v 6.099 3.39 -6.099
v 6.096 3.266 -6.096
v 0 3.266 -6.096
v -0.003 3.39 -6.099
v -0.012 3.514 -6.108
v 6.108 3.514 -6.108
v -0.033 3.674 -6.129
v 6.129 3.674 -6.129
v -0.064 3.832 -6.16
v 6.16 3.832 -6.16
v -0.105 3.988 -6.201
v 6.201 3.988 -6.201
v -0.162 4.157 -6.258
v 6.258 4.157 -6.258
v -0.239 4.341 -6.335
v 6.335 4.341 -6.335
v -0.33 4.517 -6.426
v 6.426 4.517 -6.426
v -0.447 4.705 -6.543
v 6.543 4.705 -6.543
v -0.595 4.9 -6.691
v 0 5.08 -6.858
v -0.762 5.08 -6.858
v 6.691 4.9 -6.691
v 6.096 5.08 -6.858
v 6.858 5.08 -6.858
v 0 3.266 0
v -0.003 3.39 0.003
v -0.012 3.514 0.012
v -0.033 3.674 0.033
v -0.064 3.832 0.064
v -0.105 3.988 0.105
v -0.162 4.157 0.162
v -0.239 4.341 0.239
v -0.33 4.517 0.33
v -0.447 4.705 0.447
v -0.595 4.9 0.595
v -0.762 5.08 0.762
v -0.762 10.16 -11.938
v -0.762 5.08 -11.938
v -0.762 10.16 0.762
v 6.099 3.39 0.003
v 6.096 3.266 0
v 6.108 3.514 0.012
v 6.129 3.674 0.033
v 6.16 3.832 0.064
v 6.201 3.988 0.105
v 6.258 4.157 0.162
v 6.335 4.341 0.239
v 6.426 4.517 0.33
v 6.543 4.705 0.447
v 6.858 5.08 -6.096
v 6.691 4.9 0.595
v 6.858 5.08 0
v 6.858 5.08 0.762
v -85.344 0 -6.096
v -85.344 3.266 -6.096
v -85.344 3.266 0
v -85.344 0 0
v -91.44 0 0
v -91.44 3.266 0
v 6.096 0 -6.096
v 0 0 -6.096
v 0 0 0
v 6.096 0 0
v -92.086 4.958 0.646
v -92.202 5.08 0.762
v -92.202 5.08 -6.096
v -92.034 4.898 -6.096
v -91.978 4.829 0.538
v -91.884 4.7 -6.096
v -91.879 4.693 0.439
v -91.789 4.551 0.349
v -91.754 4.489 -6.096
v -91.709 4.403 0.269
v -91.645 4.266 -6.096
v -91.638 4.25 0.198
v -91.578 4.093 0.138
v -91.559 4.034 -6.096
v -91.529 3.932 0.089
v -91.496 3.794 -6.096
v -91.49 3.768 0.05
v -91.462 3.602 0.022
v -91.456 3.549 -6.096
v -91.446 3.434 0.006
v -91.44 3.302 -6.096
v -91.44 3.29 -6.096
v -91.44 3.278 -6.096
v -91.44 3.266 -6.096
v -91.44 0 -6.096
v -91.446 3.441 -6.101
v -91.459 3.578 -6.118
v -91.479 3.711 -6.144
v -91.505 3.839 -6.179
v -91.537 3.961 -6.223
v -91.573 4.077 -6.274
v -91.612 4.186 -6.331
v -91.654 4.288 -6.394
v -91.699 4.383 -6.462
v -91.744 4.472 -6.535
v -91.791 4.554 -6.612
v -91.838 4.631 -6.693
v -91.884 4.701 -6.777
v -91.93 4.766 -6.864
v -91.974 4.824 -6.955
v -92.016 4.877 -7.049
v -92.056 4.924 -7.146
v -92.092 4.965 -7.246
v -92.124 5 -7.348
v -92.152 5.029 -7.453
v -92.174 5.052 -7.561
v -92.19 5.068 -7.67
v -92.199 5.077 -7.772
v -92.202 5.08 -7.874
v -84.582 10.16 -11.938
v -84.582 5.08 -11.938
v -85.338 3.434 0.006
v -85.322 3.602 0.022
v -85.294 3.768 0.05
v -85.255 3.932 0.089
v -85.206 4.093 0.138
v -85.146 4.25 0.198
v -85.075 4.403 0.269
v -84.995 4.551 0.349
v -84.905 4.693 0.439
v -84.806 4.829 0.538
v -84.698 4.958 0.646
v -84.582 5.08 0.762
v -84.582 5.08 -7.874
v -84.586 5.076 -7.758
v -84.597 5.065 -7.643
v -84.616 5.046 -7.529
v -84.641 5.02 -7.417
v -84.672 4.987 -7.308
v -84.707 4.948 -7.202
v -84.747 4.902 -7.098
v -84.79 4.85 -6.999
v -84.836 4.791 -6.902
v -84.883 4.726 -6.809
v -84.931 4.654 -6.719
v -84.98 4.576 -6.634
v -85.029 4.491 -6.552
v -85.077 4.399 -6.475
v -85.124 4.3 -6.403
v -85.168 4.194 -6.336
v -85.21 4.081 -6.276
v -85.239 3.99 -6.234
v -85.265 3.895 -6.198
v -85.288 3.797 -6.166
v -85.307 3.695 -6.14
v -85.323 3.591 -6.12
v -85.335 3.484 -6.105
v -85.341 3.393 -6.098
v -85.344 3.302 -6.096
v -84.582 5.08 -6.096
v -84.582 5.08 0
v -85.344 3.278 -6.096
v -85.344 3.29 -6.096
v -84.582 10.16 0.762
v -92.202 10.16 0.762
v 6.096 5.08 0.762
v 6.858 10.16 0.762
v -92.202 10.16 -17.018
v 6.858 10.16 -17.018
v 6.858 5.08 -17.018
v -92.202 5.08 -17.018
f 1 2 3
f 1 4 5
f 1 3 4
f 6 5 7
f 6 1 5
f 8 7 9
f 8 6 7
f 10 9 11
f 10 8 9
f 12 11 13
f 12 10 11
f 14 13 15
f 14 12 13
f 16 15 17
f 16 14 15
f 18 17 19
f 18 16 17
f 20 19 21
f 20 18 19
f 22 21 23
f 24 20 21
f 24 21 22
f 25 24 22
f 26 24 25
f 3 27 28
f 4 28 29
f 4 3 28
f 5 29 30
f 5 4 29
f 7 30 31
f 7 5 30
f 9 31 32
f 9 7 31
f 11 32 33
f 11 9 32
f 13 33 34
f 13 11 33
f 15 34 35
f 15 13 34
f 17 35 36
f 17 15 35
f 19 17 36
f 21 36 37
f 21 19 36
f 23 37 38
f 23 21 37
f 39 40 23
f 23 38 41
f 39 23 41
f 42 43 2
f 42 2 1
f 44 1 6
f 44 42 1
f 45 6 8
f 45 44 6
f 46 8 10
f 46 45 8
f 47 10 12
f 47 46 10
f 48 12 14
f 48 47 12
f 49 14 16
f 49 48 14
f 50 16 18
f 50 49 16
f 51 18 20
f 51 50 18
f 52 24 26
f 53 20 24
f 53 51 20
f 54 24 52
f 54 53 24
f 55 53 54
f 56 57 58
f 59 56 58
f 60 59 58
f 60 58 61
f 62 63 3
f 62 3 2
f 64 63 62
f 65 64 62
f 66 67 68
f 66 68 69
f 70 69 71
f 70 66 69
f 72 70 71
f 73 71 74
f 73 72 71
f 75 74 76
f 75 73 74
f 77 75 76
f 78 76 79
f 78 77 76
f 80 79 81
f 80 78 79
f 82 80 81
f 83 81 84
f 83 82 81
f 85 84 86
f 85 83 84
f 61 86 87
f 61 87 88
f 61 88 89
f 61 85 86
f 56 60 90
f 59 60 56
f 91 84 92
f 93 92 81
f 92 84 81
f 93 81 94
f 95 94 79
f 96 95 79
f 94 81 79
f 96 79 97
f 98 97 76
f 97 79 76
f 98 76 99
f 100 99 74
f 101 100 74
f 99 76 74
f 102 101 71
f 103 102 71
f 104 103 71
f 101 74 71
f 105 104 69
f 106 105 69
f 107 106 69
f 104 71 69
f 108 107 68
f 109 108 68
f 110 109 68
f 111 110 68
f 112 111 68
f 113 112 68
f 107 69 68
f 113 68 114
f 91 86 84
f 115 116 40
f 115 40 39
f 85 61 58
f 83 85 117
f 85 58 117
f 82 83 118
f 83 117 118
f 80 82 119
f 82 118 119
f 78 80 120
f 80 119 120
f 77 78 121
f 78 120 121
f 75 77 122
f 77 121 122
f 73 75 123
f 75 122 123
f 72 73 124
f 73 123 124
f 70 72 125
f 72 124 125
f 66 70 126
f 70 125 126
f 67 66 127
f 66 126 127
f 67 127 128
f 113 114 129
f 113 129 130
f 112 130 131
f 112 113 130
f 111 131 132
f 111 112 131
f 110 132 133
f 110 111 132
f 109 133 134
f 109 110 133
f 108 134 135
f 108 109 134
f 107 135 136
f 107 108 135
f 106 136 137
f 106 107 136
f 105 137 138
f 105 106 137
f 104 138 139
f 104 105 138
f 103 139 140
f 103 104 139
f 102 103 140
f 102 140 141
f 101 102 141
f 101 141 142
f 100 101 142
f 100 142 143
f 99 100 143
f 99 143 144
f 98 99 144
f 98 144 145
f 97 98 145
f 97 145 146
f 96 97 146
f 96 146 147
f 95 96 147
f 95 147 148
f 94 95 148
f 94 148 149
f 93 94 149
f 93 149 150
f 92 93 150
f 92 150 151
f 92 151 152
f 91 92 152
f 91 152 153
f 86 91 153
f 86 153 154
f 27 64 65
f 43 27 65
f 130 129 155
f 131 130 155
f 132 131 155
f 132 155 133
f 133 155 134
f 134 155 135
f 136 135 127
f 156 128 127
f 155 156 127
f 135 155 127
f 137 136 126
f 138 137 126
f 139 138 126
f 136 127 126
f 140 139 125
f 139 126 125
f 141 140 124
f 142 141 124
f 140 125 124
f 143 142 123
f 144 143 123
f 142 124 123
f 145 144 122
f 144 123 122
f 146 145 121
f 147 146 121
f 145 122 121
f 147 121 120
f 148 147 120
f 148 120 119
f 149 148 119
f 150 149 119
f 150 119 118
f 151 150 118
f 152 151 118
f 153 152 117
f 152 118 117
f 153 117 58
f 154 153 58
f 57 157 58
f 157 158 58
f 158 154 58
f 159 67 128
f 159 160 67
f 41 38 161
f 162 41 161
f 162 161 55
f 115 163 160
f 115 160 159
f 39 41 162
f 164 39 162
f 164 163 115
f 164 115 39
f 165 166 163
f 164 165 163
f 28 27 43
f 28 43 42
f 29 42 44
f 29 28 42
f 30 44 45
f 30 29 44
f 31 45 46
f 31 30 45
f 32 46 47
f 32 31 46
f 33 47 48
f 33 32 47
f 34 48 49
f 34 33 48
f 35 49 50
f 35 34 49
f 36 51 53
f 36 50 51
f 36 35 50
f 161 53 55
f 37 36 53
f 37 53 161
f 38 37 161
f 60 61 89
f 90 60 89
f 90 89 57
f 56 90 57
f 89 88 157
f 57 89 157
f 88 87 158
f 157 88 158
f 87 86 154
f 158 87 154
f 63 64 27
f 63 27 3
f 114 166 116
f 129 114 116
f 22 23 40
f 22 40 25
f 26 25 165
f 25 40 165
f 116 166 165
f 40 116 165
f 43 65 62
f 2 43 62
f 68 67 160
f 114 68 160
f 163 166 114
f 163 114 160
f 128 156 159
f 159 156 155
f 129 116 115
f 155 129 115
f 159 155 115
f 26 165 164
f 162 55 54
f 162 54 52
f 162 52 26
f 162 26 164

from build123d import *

# Parameters (mm, degrees)
SKETCH1_W           = 6.096
SKETCH1_H           = 6.096
BOSS_EXTRUDE1_DEPTH = 5.08
SKETCH2_W           = 7.62
SKETCH2_H           = 7.62
BOSS_EXTRUDE2_DEPTH = 5.08
FILLET1_R           = 2.54
SKETCH3_W           = 7.62
SKETCH3_H           = 5.08
BOSS_EXTRUDE3_DEPTH = 10.16
SKETCH4_W           = 5.08
SKETCH4_H           = 5.08
BOSS_EXTRUDE4_DEPTH = 83.82
SKETCH6_W           = 5.08
SKETCH6_H           = 5.08
BOSS_EXTRUDE5_DEPTH = 7.62
SKETCH8_W           = 7.62
SKETCH8_H           = 5.08
BOSS_EXTRUDE6_DEPTH = 12.7
SKETCH9_W           = 6.096
SKETCH9_H           = 6.096
BOSS_EXTRUDE7_DEPTH = 5.08
FILLET7_R           = 2.54
FILLET8_R           = 2.54
FILLET9_R           = 2.54
FILLET11_R          = 1.778


with BuildPart() as part:
    # Sketch1 → Boss-Extrude1 (new body)
    with BuildSketch(Plane(origin=(0, 0, 0), x_dir=(1, 0, 0), z_dir=(0, 1, 0))):
        with Locations((3.048, 3.048)):
            Rectangle(SKETCH1_W, SKETCH1_H)
    extrude(amount=BOSS_EXTRUDE1_DEPTH)

    # Sketch2 → Boss-Extrude2 (add)
    with BuildSketch(Plane(origin=(0, 5.08, 0), x_dir=(1, 0, 0), z_dir=(0, 1, 0))):
        with Locations((3.048, 3.048)):
            Rectangle(SKETCH2_W, SKETCH2_H)
    extrude(amount=BOSS_EXTRUDE2_DEPTH)

    # Fillet1
    # the kernel refuses this fillet: 2.54 mm, written as the material it adds along each edge
    with BuildSketch(Plane(origin=(6.096, 5.08, 0), x_dir=(1, 0, 0), z_dir=(0, 0, -1)), Plane(origin=(6.096, 5.08, -6.096), x_dir=(0, 0, -1), z_dir=(-1, 0, 0)), Plane(origin=(0, 5.08, -6.096), x_dir=(-1, 0, 0), z_dir=(0, 0, 1)), Plane(origin=(0, 5.08, 0), x_dir=(0, 0, 1), z_dir=(1, 0, 0))) as fillet1_piece_1:
        with BuildLine():
            CenterArc((2.54, 1.813922821), FILLET1_R, 180, 45.572995999)
            Line((0, 1.813922821), (-0.0508, 1.813922821))
            Line((-0.0508, 1.813922821), (-0.0508, 0))
            Line((-0.0508, 0), (0, -0.0508))
            ThreePointArc((0, -0.0508), (0.381, -0.0508), (0.72644, -0.036278456))
            Line((0.72644, -0.036278456), (0.762, 0))
        make_face()
    extrude(amount=6.096)
    with BuildSketch(Plane(origin=(6.096, 5.08, 4.534807052), x_dir=(1, 0, 0), z_dir=(0, 0, -1))) as fillet1_piece_2a_section:
        with BuildLine():
            CenterArc((2.54, 1.813922821), FILLET1_R, 180, 45.572995999)
            Line((0, 1.813922821), (-0.0508, 1.813922821))
            Line((-0.0508, 1.813922821), (-0.0508, 0))
            Line((-0.0508, 0), (0, -0.0508))
            ThreePointArc((0, -0.0508), (0.381, -0.0508), (0.72644, -0.036278456))
            Line((0.72644, -0.036278456), (0.762, 0))
        make_face()
    fillet1_piece_2a = extrude(amount=10.630807052, mode=Mode.PRIVATE)
    fillet1_piece_2a = split(fillet1_piece_2a, bisect_by=Plane(origin=(6.284412047, 4.594869389, 0.762), z_dir=(0, 0, -1)), keep=Keep.TOP, mode=Mode.PRIVATE)
    fillet1_piece_2a = split(fillet1_piece_2a, bisect_by=Plane(origin=(6.284412047, 4.594869389, 0), z_dir=(0, 0, 1)), keep=Keep.TOP, mode=Mode.PRIVATE)
    with BuildSketch(Plane(origin=(0, 5.08, 0), x_dir=(0, 0, 1), z_dir=(1, 0, 0))) as fillet1_piece_2b_section:
        with BuildLine():
            CenterArc((2.54, 1.813922821), FILLET1_R, 180, 45.572995999)
            Line((0, 1.813922821), (-0.0508, 1.813922821))
            Line((-0.0508, 1.813922821), (-0.0508, 0))
            Line((-0.0508, 0), (0, -0.0508))
            ThreePointArc((0, -0.0508), (0.381, -0.0508), (0.72644, -0.036278456))
            Line((0.72644, -0.036278456), (0.762, 0))
        make_face()
    fillet1_piece_2b = extrude(amount=10.630807052, mode=Mode.PRIVATE)
    fillet1_piece_2b = split(fillet1_piece_2b, bisect_by=Plane(origin=(6.858, 4.594869389, 0.188412047), z_dir=(-1, 0, 0)), keep=Keep.TOP, mode=Mode.PRIVATE)
    fillet1_piece_2b = split(fillet1_piece_2b, bisect_by=Plane(origin=(6.096, 4.594869389, 0.188412047), z_dir=(1, 0, 0)), keep=Keep.TOP, mode=Mode.PRIVATE)
    fillet1_piece_2 = fillet1_piece_2a & fillet1_piece_2b
    add(fillet1_piece_2)
    with BuildSketch(Plane(origin=(10.630807052, 5.08, -6.096), x_dir=(0, 0, -1), z_dir=(-1, 0, 0))) as fillet1_piece_3a_section:
        with BuildLine():
            CenterArc((2.54, 1.813922821), FILLET1_R, 180, 45.572995999)
            Line((0, 1.813922821), (-0.0508, 1.813922821))
            Line((-0.0508, 1.813922821), (-0.0508, 0))
            Line((-0.0508, 0), (0, -0.0508))
            ThreePointArc((0, -0.0508), (0.381, -0.0508), (0.72644, -0.036278456))
            Line((0.72644, -0.036278456), (0.762, 0))
        make_face()
    fillet1_piece_3a = extrude(amount=10.630807052, mode=Mode.PRIVATE)
    fillet1_piece_3a = split(fillet1_piece_3a, bisect_by=Plane(origin=(6.858, 4.594869389, -6.284412047), z_dir=(-1, 0, 0)), keep=Keep.TOP, mode=Mode.PRIVATE)
    fillet1_piece_3a = split(fillet1_piece_3a, bisect_by=Plane(origin=(6.096, 4.594869389, -6.284412047), z_dir=(1, 0, 0)), keep=Keep.TOP, mode=Mode.PRIVATE)
    with BuildSketch(Plane(origin=(6.096, 5.08, 0), x_dir=(1, 0, 0), z_dir=(0, 0, -1))) as fillet1_piece_3b_section:
        with BuildLine():
            CenterArc((2.54, 1.813922821), FILLET1_R, 180, 45.572995999)
            Line((0, 1.813922821), (-0.0508, 1.813922821))
            Line((-0.0508, 1.813922821), (-0.0508, 0))
            Line((-0.0508, 0), (0, -0.0508))
            ThreePointArc((0, -0.0508), (0.381, -0.0508), (0.72644, -0.036278456))
            Line((0.72644, -0.036278456), (0.762, 0))
        make_face()
    fillet1_piece_3b = extrude(amount=10.630807052, mode=Mode.PRIVATE)
    fillet1_piece_3b = split(fillet1_piece_3b, bisect_by=Plane(origin=(6.284412047, 4.594869389, -6.858), z_dir=(0, 0, 1)), keep=Keep.TOP, mode=Mode.PRIVATE)
    fillet1_piece_3b = split(fillet1_piece_3b, bisect_by=Plane(origin=(6.284412047, 4.594869389, -6.096), z_dir=(0, 0, -1)), keep=Keep.TOP, mode=Mode.PRIVATE)
    fillet1_piece_3 = fillet1_piece_3a & fillet1_piece_3b
    add(fillet1_piece_3)
    with BuildSketch(Plane(origin=(0, 5.08, -10.630807052), x_dir=(-1, 0, 0), z_dir=(0, 0, 1))) as fillet1_piece_4a_section:
        with BuildLine():
            CenterArc((2.54, 1.813922821), FILLET1_R, 180, 45.572995999)
            Line((0, 1.813922821), (-0.0508, 1.813922821))
            Line((-0.0508, 1.813922821), (-0.0508, 0))
            Line((-0.0508, 0), (0, -0.0508))
            ThreePointArc((0, -0.0508), (0.381, -0.0508), (0.72644, -0.036278456))
            Line((0.72644, -0.036278456), (0.762, 0))
        make_face()
    fillet1_piece_4a = extrude(amount=10.630807052, mode=Mode.PRIVATE)
    fillet1_piece_4a = split(fillet1_piece_4a, bisect_by=Plane(origin=(-0.188412047, 4.594869389, -6.858), z_dir=(0, 0, 1)), keep=Keep.TOP, mode=Mode.PRIVATE)
    fillet1_piece_4a = split(fillet1_piece_4a, bisect_by=Plane(origin=(-0.188412047, 4.594869389, -6.096), z_dir=(0, 0, -1)), keep=Keep.TOP, mode=Mode.PRIVATE)
    with BuildSketch(Plane(origin=(6.096, 5.08, -6.096), x_dir=(0, 0, -1), z_dir=(-1, 0, 0))) as fillet1_piece_4b_section:
        with BuildLine():
            CenterArc((2.54, 1.813922821), FILLET1_R, 180, 45.572995999)
            Line((0, 1.813922821), (-0.0508, 1.813922821))
            Line((-0.0508, 1.813922821), (-0.0508, 0))
            Line((-0.0508, 0), (0, -0.0508))
            ThreePointArc((0, -0.0508), (0.381, -0.0508), (0.72644, -0.036278456))
            Line((0.72644, -0.036278456), (0.762, 0))
        make_face()
    fillet1_piece_4b = extrude(amount=10.630807052, mode=Mode.PRIVATE)
    fillet1_piece_4b = split(fillet1_piece_4b, bisect_by=Plane(origin=(-0.762, 4.594869389, -6.284412047), z_dir=(1, 0, 0)), keep=Keep.TOP, mode=Mode.PRIVATE)
    fillet1_piece_4b = split(fillet1_piece_4b, bisect_by=Plane(origin=(0, 4.594869389, -6.284412047), z_dir=(-1, 0, 0)), keep=Keep.TOP, mode=Mode.PRIVATE)
    fillet1_piece_4 = fillet1_piece_4a & fillet1_piece_4b
    add(fillet1_piece_4)
    with BuildSketch(Plane(origin=(0, 5.08, -6.096), x_dir=(-1, 0, 0), z_dir=(0, 0, 1))) as fillet1_piece_5a_section:
        with BuildLine():
            CenterArc((2.54, 1.813922821), FILLET1_R, 180, 45.572995999)
            Line((0, 1.813922821), (-0.0508, 1.813922821))
            Line((-0.0508, 1.813922821), (-0.0508, 0))
            Line((-0.0508, 0), (0, -0.0508))
            ThreePointArc((0, -0.0508), (0.381, -0.0508), (0.72644, -0.036278456))
            Line((0.72644, -0.036278456), (0.762, 0))
        make_face()
    fillet1_piece_5a = extrude(amount=10.630807052, mode=Mode.PRIVATE)
    fillet1_piece_5a = split(fillet1_piece_5a, bisect_by=Plane(origin=(-0.188412047, 4.594869389, 0.762), z_dir=(0, 0, -1)), keep=Keep.TOP, mode=Mode.PRIVATE)
    fillet1_piece_5a = split(fillet1_piece_5a, bisect_by=Plane(origin=(-0.188412047, 4.594869389, 0), z_dir=(0, 0, 1)), keep=Keep.TOP, mode=Mode.PRIVATE)
    with BuildSketch(Plane(origin=(-4.534807052, 5.08, 0), x_dir=(0, 0, 1), z_dir=(1, 0, 0))) as fillet1_piece_5b_section:
        with BuildLine():
            CenterArc((2.54, 1.813922821), FILLET1_R, 180, 45.572995999)
            Line((0, 1.813922821), (-0.0508, 1.813922821))
            Line((-0.0508, 1.813922821), (-0.0508, 0))
            Line((-0.0508, 0), (0, -0.0508))
            ThreePointArc((0, -0.0508), (0.381, -0.0508), (0.72644, -0.036278456))
            Line((0.72644, -0.036278456), (0.762, 0))
        make_face()
    fillet1_piece_5b = extrude(amount=10.630807052, mode=Mode.PRIVATE)
    fillet1_piece_5b = split(fillet1_piece_5b, bisect_by=Plane(origin=(-0.762, 4.594869389, 0.188412047), z_dir=(1, 0, 0)), keep=Keep.TOP, mode=Mode.PRIVATE)
    fillet1_piece_5b = split(fillet1_piece_5b, bisect_by=Plane(origin=(0, 4.594869389, 0.188412047), z_dir=(-1, 0, 0)), keep=Keep.TOP, mode=Mode.PRIVATE)
    fillet1_piece_5 = fillet1_piece_5a & fillet1_piece_5b
    add(fillet1_piece_5)

    # Sketch3 → Boss-Extrude3 (add)
    with BuildSketch(Plane(origin=(0, 0, -6.858), x_dir=(-1, 0, 0), z_dir=(0, 0, -1))):
        with Locations((-3.048, 7.62)):
            Rectangle(SKETCH3_W, SKETCH3_H)
    extrude(amount=BOSS_EXTRUDE3_DEPTH)

    # Sketch4 → Boss-Extrude4 (add)
    with BuildSketch(Plane.ZY.offset(0.762)):
        with Locations((-14.478, 7.62)):
            Rectangle(SKETCH4_W, SKETCH4_H)
    extrude(amount=BOSS_EXTRUDE4_DEPTH)

    # Sketch6 → Boss-Extrude5 (add)
    with BuildSketch(Plane.ZY.offset(84.582)):
        with Locations((-14.478, 7.62)):
            Rectangle(SKETCH6_W, SKETCH6_H)
    extrude(amount=BOSS_EXTRUDE5_DEPTH)

    # Sketch8 → Boss-Extrude6 (add)
    with BuildSketch(Plane.XY.offset(-11.938)):
        with Locations((-88.392, 7.62)):
            Rectangle(SKETCH8_W, SKETCH8_H)
    extrude(amount=BOSS_EXTRUDE6_DEPTH)

    # Sketch9 → Boss-Extrude7 (add)
    with BuildSketch(Plane.XZ.offset(-5.08)):
        with Locations((-88.392, -3.048)):
            Rectangle(SKETCH9_W, SKETCH9_H)
    extrude(amount=BOSS_EXTRUDE7_DEPTH)

    # Fillet7
    # the kernel refuses this fillet: 2.54 mm, written as the material it adds along each edge
    with BuildSketch(Plane(origin=(-85.344, 5.08, 0), x_dir=(1, 0, 0), z_dir=(0, 0, -1))) as fillet7_piece_1:
        with BuildLine():
            CenterArc((2.54, 1.813922821), FILLET7_R, 180, 45.572995999)
            Line((0, 1.813922821), (-0.0508, 1.813922821))
            Line((-0.0508, 1.813922821), (-0.0508, 0))
            Line((-0.0508, 0), (0, -0.0508))
            ThreePointArc((0, -0.0508), (0.381, -0.0508), (0.72644, -0.036278456))
            Line((0.72644, -0.036278456), (0.762, 0))
        make_face()
    extrude(amount=6.096)

    # Fillet8
    # the kernel refuses this fillet: 2.54 mm, written as the material it adds along each edge
    with BuildSketch(Plane(origin=(-84.582, 5.08, 0), x_dir=(0, 0, 1), z_dir=(-1, 0, 0))) as fillet8_piece_1_section:
        with BuildLine():
            CenterArc((2.54, -1.813922821), FILLET8_R, 134.427004001, 45.572995999)
            Line((0, -1.813922821), (-0.0508, -1.813922821))
            Line((-0.0508, -1.813922821), (-0.0508, 0))
            Line((-0.0508, 0), (0, 0.0508))
            ThreePointArc((0, 0.0508), (0.381, 0.0508), (0.72644, 0.036278456))
            Line((0.72644, 0.036278456), (0.762, 0))
        make_face()
    fillet8_piece_1 = extrude(amount=6.858, mode=Mode.PRIVATE)
    fillet8_piece_1 = fillet8_piece_1 - Plane(origin=(-82.804, 3.266077179, 0.249051063), x_dir=(1, 0, 0), z_dir=(0, 0, 1)) * Cylinder(2.54, 21, mode=Mode.PRIVATE)
    add(fillet8_piece_1)

    # Fillet9
    # the kernel refuses this fillet: 2.54 mm, written as the material it adds along each edge
    with BuildSketch(Plane(origin=(-91.44, 5.08, 0.762), x_dir=(-1, 0, 0), z_dir=(0, 0, -1))) as fillet9_piece_1_section:
        with BuildLine():
            CenterArc((2.54, -1.813922821), FILLET9_R, 134.427004001, 45.572995999)
            Line((0, -1.813922821), (-0.0508, -1.813922821))
            Line((-0.0508, -1.813922821), (-0.0508, 0))
            Line((-0.0508, 0), (0, 0.0508))
            ThreePointArc((0, 0.0508), (0.381, 0.0508), (0.72644, 0.036278456))
            Line((0.72644, 0.036278456), (0.762, 0))
        make_face()
    fillet9_piece_1 = extrude(amount=6.858, mode=Mode.PRIVATE)
    fillet9_piece_1 = fillet9_piece_1 - Plane(origin=(-91.689051063, 3.266077179, 2.54), x_dir=(0, 0, 1), z_dir=(1, 0, 0)) * Cylinder(2.54, 21, mode=Mode.PRIVATE)
    add(fillet9_piece_1)

    # Fillet11
    # the kernel refuses this fillet: 1.778 mm, written as the material it adds along each edge
    with BuildSketch(Plane(origin=(-92.202, 5.08, -6.096), x_dir=(0, 0, -1), z_dir=(1, 0, 0))) as fillet11_piece_1_section:
        with BuildLine():
            CenterArc((FILLET11_R, -FILLET11_R), FILLET11_R, 90, 90)
            Line((0, -FILLET11_R), (0, 0))
            Line((0, 0), (FILLET11_R, 0))
        make_face()
    fillet11_piece_1 = extrude(amount=7.62, mode=Mode.PRIVATE)
    fillet11_piece_1 = fillet11_piece_1 - Plane(origin=(-93.98, 3.266077179, -6.513594947), x_dir=(-1, 0, 0), z_dir=(0, 0, 1)) * Cylinder(2.54, 23, mode=Mode.PRIVATE)
    fillet11_piece_1 = fillet11_piece_1 - Plane(origin=(-82.804, 3.266077179, -6.513594947), x_dir=(1, 0, 0), z_dir=(0, 0, 1)) * Cylinder(2.54, 23, mode=Mode.PRIVATE)
    add(fillet11_piece_1)


solid = part.part
